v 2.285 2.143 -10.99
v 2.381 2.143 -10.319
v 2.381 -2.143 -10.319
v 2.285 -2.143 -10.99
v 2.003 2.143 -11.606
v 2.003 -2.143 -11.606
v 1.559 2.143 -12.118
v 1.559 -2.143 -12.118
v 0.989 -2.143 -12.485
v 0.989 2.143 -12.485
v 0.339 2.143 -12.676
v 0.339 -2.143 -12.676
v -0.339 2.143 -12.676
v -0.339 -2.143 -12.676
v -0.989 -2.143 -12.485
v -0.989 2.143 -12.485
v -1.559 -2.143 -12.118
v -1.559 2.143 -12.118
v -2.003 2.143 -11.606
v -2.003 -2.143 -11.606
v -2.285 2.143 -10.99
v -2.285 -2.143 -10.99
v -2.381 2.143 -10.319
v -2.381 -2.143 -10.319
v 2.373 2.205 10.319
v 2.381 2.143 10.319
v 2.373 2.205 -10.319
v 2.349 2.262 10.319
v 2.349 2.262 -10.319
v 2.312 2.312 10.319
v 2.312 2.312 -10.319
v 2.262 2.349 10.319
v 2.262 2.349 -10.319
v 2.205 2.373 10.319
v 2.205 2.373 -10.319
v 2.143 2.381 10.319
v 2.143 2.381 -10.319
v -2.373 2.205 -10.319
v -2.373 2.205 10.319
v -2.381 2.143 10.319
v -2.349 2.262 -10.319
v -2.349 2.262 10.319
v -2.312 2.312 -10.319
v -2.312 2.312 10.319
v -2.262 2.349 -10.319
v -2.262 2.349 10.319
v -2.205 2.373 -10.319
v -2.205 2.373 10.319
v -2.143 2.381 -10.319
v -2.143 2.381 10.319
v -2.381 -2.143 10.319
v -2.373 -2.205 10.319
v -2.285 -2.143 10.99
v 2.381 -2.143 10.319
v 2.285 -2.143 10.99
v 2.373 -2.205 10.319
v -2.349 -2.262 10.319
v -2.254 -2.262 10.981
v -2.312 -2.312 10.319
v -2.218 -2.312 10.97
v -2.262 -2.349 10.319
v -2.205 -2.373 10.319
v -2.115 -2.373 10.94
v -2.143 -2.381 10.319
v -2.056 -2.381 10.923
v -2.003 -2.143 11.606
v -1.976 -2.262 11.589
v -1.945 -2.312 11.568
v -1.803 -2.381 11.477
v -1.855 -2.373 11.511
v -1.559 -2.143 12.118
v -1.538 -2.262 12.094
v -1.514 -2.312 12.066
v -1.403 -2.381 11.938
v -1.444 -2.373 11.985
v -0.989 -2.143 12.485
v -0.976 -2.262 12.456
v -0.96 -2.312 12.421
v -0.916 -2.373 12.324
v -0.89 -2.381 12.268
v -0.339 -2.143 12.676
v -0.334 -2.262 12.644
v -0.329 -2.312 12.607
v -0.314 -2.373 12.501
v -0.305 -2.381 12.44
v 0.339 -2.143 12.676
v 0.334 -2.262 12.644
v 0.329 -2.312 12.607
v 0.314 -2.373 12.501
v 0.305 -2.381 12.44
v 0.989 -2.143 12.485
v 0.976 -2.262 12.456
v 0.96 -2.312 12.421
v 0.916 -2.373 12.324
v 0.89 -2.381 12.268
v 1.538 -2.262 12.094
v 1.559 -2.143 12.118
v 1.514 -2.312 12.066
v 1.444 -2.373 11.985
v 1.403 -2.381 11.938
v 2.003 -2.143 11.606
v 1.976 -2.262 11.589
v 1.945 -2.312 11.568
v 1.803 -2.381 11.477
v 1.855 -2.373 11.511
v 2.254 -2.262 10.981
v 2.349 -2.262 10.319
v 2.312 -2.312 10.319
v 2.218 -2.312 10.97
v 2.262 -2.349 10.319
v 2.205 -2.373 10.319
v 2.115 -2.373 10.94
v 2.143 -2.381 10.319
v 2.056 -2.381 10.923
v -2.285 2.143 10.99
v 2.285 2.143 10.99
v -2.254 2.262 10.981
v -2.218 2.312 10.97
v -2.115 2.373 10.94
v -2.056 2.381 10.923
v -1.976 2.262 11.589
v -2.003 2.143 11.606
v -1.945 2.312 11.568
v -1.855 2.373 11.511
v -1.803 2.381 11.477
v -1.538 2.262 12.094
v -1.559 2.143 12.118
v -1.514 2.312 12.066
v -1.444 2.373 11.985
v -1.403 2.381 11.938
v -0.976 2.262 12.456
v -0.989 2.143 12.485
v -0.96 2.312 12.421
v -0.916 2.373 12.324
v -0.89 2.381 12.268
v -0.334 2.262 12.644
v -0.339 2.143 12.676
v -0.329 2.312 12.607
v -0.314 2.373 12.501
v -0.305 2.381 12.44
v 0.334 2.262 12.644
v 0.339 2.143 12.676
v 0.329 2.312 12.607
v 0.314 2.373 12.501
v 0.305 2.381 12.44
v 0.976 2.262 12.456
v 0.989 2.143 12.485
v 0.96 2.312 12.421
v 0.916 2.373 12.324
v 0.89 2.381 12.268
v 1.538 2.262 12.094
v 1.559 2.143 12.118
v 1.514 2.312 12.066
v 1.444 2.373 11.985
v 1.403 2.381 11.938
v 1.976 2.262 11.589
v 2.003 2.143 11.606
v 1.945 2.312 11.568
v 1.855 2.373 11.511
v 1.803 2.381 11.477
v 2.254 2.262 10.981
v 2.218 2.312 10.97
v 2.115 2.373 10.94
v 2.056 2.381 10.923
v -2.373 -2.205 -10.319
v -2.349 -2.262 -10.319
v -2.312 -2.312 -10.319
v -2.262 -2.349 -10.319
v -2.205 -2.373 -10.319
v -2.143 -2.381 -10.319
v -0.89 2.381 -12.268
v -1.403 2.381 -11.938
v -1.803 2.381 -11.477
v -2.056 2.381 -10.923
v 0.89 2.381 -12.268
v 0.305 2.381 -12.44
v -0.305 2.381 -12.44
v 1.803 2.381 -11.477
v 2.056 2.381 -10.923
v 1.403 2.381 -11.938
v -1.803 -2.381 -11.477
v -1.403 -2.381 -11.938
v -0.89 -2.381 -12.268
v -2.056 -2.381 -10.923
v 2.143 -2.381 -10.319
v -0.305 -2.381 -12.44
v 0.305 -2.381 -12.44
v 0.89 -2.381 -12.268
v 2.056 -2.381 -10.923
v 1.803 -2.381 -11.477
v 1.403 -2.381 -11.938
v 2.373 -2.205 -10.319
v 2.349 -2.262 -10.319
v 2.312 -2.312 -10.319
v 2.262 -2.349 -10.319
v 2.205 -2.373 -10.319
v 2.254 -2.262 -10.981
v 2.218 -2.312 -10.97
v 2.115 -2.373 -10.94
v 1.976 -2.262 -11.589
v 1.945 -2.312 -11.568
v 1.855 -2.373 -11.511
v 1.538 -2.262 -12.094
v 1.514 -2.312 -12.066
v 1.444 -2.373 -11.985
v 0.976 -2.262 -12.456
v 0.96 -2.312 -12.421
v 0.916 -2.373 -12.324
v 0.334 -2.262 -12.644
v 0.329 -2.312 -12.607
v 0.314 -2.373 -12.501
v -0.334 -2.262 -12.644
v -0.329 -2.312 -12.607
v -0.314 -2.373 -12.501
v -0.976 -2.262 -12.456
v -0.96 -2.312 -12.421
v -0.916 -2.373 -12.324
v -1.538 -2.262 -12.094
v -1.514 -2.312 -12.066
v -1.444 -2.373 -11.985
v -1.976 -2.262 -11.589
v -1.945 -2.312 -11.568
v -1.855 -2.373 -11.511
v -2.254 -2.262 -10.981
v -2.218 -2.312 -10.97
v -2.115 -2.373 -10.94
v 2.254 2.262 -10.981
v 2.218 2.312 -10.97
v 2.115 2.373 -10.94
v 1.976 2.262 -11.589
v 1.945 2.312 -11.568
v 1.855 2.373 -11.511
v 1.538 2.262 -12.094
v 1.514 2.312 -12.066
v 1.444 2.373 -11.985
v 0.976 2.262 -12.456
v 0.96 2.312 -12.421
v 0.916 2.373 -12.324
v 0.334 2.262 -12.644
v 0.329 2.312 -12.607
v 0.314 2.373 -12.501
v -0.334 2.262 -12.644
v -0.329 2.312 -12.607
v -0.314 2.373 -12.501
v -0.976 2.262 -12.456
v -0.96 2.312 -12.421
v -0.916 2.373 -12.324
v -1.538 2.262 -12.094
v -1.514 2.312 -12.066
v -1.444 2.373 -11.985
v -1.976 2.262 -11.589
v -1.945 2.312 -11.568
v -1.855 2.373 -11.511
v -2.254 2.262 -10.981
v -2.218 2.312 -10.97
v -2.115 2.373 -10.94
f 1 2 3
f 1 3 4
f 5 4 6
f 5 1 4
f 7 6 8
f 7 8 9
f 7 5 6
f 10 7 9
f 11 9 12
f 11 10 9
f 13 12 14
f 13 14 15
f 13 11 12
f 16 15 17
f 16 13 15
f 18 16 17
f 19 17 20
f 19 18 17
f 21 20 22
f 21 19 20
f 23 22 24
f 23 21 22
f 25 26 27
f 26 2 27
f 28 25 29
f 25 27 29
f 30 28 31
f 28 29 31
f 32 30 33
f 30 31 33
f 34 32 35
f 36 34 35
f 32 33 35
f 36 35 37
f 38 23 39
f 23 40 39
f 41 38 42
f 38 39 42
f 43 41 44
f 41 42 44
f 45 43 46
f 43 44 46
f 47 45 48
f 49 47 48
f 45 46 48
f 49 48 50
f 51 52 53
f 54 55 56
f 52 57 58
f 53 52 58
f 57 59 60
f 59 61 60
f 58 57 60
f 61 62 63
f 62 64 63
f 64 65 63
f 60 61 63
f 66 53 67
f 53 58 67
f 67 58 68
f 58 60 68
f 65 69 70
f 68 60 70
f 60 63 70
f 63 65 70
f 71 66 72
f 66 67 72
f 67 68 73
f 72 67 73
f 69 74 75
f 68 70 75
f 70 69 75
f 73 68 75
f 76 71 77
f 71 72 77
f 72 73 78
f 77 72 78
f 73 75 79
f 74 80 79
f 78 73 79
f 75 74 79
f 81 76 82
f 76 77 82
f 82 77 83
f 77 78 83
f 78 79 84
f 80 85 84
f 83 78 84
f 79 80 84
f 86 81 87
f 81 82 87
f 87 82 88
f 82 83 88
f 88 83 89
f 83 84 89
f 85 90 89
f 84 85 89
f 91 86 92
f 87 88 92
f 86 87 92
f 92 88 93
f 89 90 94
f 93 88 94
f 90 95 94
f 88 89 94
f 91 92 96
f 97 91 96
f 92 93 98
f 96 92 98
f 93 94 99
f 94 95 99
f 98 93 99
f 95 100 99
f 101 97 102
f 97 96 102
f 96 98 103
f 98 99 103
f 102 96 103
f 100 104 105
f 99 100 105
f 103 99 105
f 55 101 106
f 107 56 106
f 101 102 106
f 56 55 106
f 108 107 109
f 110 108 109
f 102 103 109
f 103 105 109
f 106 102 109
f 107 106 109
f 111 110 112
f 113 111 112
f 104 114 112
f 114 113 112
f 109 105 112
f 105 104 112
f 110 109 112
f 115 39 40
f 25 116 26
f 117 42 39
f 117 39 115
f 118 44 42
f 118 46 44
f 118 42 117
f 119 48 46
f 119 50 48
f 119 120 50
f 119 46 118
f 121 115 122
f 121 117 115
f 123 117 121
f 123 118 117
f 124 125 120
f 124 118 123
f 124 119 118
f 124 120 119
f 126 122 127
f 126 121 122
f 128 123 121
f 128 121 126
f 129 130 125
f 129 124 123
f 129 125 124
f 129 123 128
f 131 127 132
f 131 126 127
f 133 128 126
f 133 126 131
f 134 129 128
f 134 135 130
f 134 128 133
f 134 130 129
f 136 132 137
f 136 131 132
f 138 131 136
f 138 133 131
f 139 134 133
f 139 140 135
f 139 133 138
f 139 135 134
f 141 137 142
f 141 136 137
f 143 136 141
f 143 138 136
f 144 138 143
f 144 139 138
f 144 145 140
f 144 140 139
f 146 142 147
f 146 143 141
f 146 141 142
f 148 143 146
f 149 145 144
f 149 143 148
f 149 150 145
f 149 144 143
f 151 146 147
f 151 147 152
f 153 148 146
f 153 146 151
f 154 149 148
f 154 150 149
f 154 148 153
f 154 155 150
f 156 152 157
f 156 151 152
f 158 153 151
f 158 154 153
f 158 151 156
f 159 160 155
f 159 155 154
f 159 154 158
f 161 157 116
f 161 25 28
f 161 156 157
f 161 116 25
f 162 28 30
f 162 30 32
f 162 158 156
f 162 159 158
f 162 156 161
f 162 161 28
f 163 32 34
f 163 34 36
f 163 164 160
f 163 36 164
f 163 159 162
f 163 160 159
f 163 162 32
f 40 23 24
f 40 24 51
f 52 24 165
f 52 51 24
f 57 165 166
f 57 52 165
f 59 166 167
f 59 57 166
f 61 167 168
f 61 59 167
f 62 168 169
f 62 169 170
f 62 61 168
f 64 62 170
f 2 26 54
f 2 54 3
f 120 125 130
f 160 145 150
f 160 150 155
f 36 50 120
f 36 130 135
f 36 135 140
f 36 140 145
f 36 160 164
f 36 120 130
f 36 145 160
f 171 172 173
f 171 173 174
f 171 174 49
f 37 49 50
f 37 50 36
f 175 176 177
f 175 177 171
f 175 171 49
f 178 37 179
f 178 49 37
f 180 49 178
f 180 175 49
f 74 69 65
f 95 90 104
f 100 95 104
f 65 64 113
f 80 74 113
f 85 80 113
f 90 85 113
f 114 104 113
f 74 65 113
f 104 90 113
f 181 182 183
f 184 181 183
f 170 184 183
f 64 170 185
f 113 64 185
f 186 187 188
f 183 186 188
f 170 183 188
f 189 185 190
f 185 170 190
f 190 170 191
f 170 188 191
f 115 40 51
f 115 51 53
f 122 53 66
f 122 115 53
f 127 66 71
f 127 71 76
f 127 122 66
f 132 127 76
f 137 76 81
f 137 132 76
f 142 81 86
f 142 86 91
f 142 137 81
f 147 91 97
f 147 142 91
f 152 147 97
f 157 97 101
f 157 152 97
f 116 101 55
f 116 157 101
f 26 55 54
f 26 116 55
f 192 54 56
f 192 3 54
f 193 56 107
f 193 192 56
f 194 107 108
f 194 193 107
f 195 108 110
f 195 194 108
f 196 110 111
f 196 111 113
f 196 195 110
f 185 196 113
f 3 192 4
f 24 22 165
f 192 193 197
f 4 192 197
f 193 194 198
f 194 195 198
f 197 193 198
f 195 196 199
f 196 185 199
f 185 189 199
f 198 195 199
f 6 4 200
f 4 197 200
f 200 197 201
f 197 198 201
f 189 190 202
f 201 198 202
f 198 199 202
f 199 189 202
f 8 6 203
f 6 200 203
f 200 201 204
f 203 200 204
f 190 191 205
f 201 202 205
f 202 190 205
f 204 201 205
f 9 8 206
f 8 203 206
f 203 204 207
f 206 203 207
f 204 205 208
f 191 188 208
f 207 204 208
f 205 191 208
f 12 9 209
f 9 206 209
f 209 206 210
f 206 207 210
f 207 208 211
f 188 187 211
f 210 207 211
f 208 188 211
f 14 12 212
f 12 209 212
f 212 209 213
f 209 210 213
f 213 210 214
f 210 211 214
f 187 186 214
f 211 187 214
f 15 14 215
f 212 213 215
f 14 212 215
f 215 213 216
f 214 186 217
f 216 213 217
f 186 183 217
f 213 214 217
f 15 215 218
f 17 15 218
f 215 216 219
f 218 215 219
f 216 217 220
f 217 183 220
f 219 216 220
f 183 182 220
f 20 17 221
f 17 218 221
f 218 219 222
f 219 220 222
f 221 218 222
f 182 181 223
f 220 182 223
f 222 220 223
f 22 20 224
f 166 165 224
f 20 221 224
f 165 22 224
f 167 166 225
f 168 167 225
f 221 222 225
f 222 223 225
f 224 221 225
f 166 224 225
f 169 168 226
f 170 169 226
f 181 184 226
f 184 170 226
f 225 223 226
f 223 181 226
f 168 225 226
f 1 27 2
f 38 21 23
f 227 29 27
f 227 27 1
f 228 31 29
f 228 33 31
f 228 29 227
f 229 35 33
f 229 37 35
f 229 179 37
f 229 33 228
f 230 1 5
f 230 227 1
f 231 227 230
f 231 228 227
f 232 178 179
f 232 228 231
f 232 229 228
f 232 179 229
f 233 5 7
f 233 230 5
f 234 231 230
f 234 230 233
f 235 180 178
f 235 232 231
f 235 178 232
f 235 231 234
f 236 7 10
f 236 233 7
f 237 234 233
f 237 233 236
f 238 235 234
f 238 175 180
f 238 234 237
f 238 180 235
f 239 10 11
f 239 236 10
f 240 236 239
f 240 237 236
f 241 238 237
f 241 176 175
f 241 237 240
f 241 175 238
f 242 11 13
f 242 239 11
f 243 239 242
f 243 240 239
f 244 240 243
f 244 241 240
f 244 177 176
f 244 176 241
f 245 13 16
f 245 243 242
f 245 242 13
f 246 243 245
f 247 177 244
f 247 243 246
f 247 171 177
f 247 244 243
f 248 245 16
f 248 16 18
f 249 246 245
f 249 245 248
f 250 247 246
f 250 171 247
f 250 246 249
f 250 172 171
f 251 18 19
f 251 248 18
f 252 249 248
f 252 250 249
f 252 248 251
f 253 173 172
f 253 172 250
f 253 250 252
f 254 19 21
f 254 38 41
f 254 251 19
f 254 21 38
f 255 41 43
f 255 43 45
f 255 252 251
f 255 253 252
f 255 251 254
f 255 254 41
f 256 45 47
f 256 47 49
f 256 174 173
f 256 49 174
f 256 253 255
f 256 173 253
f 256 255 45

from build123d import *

# Parameters (mm, degrees)
BOSS_EXTRUDE1_START = 2.38125
BOSS_EXTRUDE1_DEPTH = 4.7625
FILLET1_R           = 0.238125


with BuildPart() as part:
    # Sketch4 → Boss-Extrude1 (new body)
    with BuildSketch(Plane(origin=(0, 0, 0), x_dir=(1, 0, 0), z_dir=(0, 1, 0)).offset(BOSS_EXTRUDE1_START)):
        with BuildLine():
            Line((-2.38125, 10.31875), (-2.38125, -10.31875))
            ThreePointArc((-2.38125, -10.31875), (0, -12.7), (2.38125, -10.31875))
            Line((2.38125, -10.31875), (2.38125, 10.31875))
            ThreePointArc((2.38125, 10.31875), (0, 12.7), (-2.38125, 10.31875))
        make_face()
    extrude(amount=-BOSS_EXTRUDE1_DEPTH)

    # Fillet1
    fillet1_edges = [part.edges().sort_by_distance(p)[0] for p in [
        (0, -2.38125, 12.7),
        (2.38125, -2.38125, 0),
        (0, -2.38125, -12.7),
        (2.38125, 2.38125, 0),
        (0, 2.38125, 12.7),
        (-2.38125, 2.38125, 0),
        (0, 2.38125, -12.7),
        (-2.38125, -2.38125, 0),
    ]]
    fillet(fillet1_edges, radius=FILLET1_R)


solid = part.part
